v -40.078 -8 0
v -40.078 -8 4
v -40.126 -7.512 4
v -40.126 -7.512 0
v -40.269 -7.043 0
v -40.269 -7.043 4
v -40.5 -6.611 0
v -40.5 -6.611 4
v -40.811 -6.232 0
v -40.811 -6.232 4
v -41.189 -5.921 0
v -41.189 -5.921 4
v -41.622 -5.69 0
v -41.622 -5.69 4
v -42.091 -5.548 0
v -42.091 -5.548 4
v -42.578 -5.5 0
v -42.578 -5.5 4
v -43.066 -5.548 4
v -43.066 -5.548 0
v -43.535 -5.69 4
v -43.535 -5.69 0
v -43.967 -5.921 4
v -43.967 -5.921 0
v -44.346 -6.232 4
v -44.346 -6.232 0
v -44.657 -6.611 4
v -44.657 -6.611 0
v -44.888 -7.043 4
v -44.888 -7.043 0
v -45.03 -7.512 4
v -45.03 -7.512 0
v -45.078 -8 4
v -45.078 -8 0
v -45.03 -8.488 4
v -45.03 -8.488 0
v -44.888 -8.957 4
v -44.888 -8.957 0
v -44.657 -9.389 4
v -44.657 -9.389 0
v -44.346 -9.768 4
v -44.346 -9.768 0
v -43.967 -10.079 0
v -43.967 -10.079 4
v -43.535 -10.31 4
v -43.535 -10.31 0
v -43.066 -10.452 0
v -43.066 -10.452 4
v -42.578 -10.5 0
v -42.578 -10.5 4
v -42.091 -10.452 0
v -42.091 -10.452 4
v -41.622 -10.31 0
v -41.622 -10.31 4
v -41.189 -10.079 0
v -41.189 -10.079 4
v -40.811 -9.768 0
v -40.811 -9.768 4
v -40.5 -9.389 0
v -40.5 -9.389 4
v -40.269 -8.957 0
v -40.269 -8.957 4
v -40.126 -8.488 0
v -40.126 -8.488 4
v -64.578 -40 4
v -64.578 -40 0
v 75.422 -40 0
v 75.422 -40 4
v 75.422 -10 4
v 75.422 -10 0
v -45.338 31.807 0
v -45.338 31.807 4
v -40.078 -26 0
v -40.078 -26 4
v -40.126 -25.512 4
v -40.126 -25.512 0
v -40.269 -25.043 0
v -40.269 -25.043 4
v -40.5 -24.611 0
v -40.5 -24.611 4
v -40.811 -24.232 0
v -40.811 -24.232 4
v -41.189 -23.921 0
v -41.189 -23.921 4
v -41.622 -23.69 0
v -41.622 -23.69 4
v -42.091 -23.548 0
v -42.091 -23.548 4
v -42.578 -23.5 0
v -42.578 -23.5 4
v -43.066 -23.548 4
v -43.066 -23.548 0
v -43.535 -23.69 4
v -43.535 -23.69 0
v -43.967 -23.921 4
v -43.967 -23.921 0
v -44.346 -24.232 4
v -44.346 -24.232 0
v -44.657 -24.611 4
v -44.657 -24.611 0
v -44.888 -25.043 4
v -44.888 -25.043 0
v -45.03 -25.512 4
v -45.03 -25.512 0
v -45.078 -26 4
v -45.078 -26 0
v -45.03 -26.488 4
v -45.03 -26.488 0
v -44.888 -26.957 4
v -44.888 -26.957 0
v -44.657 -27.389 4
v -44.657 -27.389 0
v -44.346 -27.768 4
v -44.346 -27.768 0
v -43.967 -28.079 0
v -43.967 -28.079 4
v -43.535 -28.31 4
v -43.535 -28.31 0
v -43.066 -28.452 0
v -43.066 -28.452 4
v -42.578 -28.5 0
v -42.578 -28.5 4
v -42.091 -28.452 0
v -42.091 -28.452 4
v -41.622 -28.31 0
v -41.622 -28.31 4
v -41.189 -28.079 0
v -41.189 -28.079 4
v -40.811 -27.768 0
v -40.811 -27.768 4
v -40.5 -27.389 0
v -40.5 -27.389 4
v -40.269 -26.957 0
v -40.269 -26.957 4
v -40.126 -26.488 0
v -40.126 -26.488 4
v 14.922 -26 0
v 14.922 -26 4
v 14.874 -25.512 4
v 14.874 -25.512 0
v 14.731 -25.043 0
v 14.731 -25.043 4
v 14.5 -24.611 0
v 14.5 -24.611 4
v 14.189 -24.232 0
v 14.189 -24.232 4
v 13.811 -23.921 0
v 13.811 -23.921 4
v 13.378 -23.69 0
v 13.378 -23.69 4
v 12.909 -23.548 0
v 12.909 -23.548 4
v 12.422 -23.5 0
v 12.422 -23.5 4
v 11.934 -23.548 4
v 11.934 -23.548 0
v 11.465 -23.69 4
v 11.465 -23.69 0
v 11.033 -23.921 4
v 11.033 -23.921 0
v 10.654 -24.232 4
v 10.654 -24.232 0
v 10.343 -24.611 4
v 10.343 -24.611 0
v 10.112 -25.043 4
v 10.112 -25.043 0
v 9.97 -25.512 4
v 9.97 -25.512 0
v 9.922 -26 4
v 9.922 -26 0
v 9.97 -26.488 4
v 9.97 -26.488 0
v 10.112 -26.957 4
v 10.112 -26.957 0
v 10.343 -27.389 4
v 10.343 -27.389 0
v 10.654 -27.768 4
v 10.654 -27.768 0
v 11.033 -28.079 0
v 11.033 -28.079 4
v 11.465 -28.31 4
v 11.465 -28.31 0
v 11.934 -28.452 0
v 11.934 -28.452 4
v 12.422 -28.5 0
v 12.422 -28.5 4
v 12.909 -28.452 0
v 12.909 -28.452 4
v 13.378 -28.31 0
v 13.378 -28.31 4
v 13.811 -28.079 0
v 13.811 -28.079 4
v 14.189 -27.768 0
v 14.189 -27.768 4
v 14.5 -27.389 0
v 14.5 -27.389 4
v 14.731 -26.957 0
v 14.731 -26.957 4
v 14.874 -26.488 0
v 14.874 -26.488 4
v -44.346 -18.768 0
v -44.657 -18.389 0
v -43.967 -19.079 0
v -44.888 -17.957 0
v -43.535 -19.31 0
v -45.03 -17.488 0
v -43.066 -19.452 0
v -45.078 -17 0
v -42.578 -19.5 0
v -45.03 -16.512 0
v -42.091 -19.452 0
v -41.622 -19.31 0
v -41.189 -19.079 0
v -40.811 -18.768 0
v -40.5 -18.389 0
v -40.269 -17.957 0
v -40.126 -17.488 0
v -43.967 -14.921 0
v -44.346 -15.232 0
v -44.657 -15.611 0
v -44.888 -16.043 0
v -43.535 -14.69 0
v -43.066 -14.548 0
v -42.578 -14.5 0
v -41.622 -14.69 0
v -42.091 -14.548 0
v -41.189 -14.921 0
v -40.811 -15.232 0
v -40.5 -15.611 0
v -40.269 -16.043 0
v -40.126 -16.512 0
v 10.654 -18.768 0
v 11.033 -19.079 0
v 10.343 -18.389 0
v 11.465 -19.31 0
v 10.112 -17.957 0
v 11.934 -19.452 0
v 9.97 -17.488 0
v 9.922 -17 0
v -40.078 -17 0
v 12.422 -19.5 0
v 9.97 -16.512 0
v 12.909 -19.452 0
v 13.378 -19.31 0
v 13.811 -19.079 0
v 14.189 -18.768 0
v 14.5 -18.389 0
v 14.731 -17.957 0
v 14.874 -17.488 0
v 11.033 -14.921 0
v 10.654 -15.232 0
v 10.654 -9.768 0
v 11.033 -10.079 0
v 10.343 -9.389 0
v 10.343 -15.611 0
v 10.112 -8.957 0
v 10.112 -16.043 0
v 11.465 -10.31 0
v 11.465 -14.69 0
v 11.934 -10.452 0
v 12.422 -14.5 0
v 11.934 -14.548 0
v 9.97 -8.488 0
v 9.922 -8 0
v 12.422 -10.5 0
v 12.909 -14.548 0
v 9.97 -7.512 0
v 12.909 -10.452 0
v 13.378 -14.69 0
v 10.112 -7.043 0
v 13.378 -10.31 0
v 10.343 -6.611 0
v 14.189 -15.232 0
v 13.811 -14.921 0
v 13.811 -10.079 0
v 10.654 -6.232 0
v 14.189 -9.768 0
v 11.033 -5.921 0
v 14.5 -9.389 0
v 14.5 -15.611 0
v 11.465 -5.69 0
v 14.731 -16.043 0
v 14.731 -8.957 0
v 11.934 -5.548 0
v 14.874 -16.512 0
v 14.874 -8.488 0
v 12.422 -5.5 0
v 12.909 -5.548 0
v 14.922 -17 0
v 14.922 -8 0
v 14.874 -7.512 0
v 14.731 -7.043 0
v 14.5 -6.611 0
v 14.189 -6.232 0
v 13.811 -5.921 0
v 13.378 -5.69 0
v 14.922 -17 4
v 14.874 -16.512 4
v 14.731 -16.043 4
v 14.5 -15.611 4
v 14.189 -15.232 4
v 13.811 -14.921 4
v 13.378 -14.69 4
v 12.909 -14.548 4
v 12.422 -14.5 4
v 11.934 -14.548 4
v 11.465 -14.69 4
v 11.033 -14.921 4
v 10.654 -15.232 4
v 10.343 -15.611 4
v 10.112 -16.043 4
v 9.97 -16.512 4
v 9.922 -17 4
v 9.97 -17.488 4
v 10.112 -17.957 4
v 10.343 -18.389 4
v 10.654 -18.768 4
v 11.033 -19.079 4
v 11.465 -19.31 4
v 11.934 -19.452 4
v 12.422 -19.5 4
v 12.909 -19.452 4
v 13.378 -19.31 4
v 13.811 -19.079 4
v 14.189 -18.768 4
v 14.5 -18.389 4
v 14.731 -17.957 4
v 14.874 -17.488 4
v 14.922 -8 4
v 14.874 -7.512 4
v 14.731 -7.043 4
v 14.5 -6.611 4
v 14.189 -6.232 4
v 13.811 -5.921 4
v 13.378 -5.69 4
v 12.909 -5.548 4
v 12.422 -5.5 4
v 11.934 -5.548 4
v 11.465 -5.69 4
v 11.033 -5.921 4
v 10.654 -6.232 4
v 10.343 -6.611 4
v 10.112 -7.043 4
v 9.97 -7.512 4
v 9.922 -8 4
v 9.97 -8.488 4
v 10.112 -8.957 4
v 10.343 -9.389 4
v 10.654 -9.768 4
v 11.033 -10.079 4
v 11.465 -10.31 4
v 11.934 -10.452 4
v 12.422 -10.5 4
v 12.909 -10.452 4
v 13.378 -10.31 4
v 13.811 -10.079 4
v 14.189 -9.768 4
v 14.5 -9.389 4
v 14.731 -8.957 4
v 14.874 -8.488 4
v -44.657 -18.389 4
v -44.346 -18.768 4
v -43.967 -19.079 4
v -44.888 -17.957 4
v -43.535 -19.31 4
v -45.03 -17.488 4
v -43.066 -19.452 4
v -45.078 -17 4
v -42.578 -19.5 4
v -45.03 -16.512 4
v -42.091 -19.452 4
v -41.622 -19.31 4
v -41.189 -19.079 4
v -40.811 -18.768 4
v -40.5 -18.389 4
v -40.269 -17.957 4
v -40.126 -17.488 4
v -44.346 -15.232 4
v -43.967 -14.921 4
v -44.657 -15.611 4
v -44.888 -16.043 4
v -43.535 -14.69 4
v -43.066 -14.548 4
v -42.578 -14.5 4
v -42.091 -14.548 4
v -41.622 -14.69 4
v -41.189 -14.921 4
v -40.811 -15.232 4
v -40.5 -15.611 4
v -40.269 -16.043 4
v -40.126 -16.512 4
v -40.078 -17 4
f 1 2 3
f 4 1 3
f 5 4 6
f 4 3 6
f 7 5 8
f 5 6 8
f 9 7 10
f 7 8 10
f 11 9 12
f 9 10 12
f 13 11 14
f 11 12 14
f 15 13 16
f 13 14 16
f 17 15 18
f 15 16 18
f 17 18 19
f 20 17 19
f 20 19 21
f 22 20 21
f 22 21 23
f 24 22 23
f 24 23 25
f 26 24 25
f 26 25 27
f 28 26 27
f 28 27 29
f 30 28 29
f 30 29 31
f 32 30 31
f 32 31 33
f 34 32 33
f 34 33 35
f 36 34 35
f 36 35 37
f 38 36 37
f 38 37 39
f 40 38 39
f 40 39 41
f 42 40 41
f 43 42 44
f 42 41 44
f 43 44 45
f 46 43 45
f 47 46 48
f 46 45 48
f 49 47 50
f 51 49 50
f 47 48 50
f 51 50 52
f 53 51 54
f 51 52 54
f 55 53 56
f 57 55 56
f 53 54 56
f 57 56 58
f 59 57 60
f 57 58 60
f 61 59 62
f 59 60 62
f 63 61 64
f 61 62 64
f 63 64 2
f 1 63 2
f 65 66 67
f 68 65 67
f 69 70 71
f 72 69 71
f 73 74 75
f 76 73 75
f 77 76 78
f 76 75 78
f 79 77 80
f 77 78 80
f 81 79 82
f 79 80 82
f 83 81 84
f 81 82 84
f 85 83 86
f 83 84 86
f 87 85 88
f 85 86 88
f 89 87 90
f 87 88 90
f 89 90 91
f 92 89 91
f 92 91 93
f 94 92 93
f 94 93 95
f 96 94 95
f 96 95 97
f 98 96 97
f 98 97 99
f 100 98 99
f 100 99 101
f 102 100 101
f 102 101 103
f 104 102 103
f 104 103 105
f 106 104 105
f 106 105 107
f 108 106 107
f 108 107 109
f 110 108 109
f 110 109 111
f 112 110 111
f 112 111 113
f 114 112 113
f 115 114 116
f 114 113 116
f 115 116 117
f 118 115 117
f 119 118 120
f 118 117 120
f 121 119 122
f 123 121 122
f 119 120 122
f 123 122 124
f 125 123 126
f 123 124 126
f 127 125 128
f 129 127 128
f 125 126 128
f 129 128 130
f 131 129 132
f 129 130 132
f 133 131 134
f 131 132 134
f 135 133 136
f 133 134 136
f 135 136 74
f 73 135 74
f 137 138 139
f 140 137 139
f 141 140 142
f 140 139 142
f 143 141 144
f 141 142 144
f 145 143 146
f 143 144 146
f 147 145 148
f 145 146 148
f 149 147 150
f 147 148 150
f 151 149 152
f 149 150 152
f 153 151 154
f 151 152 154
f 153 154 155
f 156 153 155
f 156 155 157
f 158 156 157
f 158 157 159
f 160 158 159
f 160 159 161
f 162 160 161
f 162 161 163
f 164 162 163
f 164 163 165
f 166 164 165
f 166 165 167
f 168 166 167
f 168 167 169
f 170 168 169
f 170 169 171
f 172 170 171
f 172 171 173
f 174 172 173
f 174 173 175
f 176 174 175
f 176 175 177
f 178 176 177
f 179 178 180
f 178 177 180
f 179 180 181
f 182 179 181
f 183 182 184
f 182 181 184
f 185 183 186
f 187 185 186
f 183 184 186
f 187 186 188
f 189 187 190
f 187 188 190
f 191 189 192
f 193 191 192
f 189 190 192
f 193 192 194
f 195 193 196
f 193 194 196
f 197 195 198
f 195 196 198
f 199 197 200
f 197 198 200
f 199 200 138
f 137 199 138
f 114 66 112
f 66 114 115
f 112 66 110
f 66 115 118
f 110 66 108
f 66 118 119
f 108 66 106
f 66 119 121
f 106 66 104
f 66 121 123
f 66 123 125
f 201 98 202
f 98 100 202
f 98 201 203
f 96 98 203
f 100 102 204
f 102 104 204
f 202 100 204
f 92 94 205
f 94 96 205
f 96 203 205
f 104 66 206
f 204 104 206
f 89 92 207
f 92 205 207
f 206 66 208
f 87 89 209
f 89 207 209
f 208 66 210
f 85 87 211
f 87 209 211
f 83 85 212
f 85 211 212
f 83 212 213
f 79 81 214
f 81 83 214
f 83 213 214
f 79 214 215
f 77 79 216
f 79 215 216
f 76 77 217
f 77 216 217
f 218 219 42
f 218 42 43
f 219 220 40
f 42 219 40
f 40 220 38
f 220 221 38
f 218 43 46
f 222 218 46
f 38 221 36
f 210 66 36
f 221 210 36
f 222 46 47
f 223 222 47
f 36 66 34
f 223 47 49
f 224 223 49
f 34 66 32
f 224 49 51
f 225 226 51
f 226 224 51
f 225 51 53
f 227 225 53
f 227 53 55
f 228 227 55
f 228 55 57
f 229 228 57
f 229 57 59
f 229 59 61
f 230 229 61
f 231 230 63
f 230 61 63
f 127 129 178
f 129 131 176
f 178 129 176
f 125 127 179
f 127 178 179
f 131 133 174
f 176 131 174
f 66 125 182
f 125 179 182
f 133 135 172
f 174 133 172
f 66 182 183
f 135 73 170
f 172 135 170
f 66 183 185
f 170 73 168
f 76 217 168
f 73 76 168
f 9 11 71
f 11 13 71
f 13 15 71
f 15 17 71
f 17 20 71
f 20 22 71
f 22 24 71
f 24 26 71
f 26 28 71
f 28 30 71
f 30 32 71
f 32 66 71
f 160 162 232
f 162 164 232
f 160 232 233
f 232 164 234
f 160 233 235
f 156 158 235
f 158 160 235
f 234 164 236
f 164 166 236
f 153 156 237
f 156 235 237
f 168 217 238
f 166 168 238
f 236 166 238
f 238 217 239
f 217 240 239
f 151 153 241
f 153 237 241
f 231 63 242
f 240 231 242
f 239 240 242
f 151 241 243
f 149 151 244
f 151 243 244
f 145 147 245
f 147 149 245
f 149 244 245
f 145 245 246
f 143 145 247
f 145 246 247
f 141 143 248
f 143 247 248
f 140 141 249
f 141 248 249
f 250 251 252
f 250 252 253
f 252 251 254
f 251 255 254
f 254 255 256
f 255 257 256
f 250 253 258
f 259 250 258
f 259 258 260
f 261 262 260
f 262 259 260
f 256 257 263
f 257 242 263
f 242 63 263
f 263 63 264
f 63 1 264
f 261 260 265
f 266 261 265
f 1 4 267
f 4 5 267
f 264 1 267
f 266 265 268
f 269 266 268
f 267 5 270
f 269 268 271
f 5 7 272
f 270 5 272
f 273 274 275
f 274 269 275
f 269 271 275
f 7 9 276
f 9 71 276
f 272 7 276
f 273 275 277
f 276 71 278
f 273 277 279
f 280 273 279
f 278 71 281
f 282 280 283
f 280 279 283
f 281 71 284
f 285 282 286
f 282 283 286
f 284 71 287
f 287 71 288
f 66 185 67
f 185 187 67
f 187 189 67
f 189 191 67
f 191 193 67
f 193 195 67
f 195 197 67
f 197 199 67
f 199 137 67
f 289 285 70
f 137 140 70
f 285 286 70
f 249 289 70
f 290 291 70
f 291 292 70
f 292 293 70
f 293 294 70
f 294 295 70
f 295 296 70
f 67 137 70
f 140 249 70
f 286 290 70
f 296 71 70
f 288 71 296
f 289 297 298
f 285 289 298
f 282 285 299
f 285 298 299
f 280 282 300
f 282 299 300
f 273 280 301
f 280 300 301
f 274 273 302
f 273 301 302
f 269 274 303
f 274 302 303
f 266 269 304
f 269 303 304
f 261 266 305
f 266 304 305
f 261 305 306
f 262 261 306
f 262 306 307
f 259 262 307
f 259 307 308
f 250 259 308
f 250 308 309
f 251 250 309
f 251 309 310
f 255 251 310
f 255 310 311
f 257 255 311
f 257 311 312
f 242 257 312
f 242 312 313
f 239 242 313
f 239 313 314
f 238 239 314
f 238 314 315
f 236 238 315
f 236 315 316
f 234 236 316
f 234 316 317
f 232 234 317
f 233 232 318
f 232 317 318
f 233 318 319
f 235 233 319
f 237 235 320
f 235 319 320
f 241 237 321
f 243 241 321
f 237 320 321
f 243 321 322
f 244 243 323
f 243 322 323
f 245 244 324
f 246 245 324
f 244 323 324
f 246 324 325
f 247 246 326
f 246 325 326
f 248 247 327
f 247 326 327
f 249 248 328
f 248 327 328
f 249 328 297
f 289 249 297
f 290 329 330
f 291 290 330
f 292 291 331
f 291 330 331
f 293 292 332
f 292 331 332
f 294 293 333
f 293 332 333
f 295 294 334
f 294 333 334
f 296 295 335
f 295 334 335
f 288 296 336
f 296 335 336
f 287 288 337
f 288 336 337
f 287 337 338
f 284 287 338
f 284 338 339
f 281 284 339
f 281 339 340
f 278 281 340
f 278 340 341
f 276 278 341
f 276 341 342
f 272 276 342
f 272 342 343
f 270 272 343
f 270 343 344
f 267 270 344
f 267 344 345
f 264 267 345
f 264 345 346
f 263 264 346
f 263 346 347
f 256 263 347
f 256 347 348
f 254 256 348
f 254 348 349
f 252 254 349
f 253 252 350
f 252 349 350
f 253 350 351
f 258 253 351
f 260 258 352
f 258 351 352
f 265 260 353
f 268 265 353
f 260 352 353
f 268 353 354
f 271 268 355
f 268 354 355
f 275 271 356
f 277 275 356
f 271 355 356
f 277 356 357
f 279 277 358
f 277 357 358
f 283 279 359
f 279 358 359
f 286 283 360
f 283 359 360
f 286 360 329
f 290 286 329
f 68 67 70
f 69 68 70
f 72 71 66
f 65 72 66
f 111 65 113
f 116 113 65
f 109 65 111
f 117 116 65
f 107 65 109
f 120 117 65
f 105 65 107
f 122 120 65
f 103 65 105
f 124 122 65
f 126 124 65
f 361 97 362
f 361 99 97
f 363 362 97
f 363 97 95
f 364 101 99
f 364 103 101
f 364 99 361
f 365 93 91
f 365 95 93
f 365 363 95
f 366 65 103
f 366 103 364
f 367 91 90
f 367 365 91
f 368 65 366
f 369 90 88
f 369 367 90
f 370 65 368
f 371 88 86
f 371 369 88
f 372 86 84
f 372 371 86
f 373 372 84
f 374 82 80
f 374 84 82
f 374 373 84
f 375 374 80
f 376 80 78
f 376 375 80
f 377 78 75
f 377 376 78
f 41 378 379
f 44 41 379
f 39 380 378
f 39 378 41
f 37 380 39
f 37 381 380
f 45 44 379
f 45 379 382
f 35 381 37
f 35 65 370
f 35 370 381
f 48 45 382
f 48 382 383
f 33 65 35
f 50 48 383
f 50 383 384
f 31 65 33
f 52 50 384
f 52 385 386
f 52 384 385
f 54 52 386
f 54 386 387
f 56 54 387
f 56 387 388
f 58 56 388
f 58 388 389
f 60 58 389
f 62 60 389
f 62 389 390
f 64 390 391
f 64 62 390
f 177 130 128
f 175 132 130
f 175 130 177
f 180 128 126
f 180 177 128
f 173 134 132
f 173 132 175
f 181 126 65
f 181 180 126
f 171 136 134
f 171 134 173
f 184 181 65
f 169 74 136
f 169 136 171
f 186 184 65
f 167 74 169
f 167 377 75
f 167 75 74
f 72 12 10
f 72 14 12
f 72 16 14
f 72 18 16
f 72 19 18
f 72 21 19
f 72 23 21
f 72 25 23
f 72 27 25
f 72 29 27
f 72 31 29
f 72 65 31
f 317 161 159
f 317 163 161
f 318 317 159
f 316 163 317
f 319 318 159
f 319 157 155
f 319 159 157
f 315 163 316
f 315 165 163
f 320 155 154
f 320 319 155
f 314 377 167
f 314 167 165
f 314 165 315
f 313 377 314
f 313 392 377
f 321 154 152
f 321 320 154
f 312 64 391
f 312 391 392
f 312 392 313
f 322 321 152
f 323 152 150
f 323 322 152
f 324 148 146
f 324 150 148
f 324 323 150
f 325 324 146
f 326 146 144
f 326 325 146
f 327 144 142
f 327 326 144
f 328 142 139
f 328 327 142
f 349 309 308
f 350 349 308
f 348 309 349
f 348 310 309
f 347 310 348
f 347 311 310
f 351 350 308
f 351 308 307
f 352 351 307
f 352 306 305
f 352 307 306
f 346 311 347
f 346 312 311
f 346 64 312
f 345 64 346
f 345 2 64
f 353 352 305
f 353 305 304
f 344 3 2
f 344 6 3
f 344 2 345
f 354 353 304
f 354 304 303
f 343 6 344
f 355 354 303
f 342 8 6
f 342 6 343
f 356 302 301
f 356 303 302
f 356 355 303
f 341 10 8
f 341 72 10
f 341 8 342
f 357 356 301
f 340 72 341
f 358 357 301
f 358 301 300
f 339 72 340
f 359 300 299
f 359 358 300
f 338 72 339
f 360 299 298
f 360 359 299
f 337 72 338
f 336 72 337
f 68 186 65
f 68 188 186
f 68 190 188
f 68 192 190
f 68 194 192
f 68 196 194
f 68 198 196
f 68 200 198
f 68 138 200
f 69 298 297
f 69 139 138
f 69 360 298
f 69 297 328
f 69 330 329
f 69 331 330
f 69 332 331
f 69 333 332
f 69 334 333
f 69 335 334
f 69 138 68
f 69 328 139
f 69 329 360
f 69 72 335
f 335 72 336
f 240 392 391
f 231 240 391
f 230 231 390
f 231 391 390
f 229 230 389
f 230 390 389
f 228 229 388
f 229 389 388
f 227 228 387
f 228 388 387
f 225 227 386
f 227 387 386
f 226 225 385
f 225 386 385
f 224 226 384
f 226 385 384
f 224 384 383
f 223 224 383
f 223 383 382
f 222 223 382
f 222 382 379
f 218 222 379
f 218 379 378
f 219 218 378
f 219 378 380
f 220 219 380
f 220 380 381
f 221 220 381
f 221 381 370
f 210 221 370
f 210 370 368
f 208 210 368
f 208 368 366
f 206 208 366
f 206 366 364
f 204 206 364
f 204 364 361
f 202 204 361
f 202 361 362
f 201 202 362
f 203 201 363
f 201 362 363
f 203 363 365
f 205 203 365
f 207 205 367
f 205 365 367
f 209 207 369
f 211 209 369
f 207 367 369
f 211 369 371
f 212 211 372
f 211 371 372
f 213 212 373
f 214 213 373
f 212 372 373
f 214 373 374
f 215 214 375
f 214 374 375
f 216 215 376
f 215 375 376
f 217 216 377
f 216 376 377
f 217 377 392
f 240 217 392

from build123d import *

# Parameters (mm, degrees)
BOSS_EXTRUDE1_DEPTH = 4
SKETCH2_R           = 2.5
CUT_EXTRUDE1_DEPTH  = 10


with BuildPart() as part:
    # Sketch1 → Boss-Extrude1 (new body)
    with BuildSketch(Plane.XY):
        Polygon((75.421686747, -40), (75.421686747, -10), (-45.337786669, 31.806622775), (-64.578313253, -40), align=None)
    extrude(amount=BOSS_EXTRUDE1_DEPTH)

    # Sketch2 → Cut-Extrude1 (cut)
    with BuildSketch(Plane.XY.offset(4)):
        with Locations((-42.578313253, -17)):
            Circle(SKETCH2_R)
        with Locations((-42.578313253, -8)):
            Circle(SKETCH2_R)
        with Locations((-42.578313253, -26)):
            Circle(SKETCH2_R)
        with Locations((12.421686747, -17)):
            Circle(SKETCH2_R)
        with Locations((12.421686747, -8)):
            Circle(SKETCH2_R)
        with Locations((12.421686747, -26)):
            Circle(SKETCH2_R)
    extrude(amount=-CUT_EXTRUDE1_DEPTH, mode=Mode.SUBTRACT)


solid = part.part
